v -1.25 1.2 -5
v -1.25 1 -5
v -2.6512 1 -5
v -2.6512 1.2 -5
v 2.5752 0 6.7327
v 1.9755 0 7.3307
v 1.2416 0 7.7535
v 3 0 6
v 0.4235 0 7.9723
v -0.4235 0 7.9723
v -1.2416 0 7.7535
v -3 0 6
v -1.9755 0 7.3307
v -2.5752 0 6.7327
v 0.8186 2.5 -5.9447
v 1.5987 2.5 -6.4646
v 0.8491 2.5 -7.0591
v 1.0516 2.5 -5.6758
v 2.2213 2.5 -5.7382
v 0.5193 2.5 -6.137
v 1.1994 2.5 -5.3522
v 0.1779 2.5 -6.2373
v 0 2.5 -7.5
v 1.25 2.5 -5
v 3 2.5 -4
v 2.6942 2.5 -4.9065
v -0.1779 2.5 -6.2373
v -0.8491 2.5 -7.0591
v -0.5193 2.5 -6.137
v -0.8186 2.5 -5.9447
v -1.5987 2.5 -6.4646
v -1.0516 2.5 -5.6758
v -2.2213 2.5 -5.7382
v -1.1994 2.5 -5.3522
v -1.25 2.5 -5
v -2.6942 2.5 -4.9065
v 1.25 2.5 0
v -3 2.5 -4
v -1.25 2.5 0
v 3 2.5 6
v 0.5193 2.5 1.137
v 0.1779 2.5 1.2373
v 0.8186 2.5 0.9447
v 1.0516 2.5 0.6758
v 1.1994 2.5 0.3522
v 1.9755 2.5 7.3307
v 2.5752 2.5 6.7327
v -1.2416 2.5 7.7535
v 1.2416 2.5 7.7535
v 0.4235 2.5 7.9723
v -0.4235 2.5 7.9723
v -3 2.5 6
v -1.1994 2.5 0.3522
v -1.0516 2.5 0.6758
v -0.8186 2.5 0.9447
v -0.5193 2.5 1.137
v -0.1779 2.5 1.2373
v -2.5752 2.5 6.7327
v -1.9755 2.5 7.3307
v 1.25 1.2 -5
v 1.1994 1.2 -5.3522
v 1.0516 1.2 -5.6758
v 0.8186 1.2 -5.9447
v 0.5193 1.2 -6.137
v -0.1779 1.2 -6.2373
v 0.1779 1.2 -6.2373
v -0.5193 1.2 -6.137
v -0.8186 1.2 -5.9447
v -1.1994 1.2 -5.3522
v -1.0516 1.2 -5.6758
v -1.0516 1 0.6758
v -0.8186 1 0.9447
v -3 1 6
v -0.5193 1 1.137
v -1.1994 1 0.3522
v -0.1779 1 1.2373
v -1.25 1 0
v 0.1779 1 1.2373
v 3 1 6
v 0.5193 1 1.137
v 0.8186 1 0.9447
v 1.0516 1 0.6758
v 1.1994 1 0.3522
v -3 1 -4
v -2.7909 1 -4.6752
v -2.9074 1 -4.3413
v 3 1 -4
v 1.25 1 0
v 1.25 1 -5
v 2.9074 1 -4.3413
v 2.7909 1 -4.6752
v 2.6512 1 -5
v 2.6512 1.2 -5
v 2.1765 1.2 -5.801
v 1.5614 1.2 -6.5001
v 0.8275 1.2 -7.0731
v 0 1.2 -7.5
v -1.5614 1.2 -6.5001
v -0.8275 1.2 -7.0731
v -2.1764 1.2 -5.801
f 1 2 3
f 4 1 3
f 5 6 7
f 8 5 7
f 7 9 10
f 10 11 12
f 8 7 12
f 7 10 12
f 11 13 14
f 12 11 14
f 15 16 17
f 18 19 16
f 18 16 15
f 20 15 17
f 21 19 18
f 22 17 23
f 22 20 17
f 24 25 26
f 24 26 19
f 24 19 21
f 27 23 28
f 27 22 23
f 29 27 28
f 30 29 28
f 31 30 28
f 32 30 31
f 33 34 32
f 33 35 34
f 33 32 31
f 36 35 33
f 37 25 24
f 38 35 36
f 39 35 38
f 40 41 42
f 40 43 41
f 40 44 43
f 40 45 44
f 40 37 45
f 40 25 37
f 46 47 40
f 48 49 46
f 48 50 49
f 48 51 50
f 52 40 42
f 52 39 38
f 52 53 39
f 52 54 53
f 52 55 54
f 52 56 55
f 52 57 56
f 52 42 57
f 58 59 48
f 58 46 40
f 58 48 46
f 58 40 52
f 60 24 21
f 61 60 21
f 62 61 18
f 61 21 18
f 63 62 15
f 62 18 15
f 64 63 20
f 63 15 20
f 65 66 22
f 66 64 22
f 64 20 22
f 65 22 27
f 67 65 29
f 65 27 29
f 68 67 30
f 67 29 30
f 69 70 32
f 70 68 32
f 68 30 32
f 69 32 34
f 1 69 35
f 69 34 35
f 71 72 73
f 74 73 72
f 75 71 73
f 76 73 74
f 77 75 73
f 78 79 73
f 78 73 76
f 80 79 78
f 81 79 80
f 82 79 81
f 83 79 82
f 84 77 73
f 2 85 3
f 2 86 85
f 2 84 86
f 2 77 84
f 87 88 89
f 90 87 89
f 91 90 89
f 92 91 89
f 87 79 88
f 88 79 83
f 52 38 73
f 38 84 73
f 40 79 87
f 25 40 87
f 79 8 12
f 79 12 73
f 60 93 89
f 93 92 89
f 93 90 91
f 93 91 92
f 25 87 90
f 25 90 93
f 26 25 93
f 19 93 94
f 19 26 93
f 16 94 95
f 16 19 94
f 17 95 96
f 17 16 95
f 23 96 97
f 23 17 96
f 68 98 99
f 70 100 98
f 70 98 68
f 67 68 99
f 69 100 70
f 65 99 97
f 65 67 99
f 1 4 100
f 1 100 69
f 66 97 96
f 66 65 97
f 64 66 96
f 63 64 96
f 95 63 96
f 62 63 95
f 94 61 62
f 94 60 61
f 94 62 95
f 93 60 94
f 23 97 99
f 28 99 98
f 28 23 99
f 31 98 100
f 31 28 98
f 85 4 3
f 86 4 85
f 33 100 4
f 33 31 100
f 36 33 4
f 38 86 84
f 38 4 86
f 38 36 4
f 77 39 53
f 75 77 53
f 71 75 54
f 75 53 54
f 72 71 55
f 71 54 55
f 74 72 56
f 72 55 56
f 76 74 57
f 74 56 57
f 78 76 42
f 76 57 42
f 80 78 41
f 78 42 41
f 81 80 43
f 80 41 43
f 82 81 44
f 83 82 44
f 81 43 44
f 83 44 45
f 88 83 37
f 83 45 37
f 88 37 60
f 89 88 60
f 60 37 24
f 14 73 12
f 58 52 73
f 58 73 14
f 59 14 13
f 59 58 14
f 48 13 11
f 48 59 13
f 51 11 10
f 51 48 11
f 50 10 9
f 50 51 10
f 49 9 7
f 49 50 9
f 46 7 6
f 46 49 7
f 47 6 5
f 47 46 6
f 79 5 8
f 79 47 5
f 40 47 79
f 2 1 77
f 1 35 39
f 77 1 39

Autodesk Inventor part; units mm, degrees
ref_plane "YZ Plane" through (0, 0, 0) normal (1, 0, 0) x (0, 1, 0)
ref_plane "XZ Plane" through (0, 0, 0) normal (0, 1, 0) x (-1, 0, 0)
ref_plane "XY Plane" through (0, 0, 0) normal (0, 0, 1) x (1, 0, 0)
sketch "Sketch1" plane through (0, 0, 0) normal (0, 1, 0) x (-1, 0, 0)
  line L0 (-3, -8) -> (3, -8)
  line L1 (3, -8) -> (3, 8)
  line L2 (3, 8) -> (-3, 8)
  line L3 (-3, 8) -> (-3, -8)
  line L4 (-3, -8) -> (3, 8) construction
  line L5 (3, -8) -> (-3, 8) construction
  point P0 (0, 0)
  dimension "d0" = 16
  dimension "d1" = 6
extrude "Extrusion1" add sketch "Sketch1" along normal blind 2.5
sketch "Sketch2" plane through (0, 2.5, 0) normal (0, 1, 0) x (1, 0, 0)
  line L0 (0, 5) -> (0, 0) construction
  line L1 (-1.25, 5) -> (-1.25, 0)
  line L2 (1.25, 0) -> (1.25, 5)
  arc A0 (1.25, 5) -> (-1.25, 5) centre (0, 5) ccw
  arc A1 (-1.25, 0) -> (1.25, 0) centre (0, 0) ccw
  line L3 (-3, -8) -> (3, -8) projected
  line L4 (-3, 8) -> (-3, -8) projected
  line L5 (-3, -8) -> (3, -8) projected
  line L6 (3, -8) -> (3, 8) projected
  line L7 (3, 8) -> (-3, 8) projected
  point P0 (0, 2.5)
  point P1 (0, 2.5)
  dimension "d4" = 2.5
  dimension "d6" = 8
  dimension "d7" = 6
  dimension "d8" = 3
  dimension "d9" = 5
extrude "Extrusion2" cut sketch "Sketch2" against normal through all contours A0 L2 A1 L1
sketch "Sketch3" plane through (3, 0, 8) normal (1, 0, 0) x (0, 0, -1)
  line L0 (16, 0) -> (0, 0) projected
  line L1 (16, 0) -> (2, 0)
  line L2 (2, 0) -> (2, 1)
  line L3 (2, 1) -> (16, 1)
  line L4 (16, 1) -> (16, 0)
  line L5 (0, 0) -> (0, 2.5) projected
  line L6 (0, 2.5) -> (16, 2.5) projected
  point P0 (8, 0)
  point P1 (2, 0)
  dimension "d12" = 2
  dimension "d13" = 1.5
extrude "Extrusion3" cut sketch "Sketch3" against normal through all
sketch "Sketch4" plane through (0, 2.5, 0) normal (0, 1, 0) x (1, 0, 0)
  line L0 (-3, 8) -> (-3, -8) projected
  line L1 (3, -8) -> (3, 8) projected
  arc A0 (-3, -6) -> (3, -6) centre (0, -4.75) ccw
  line L2 (-3, -8) -> (3, -8) projected
  point P0 (0, 0)
  point P1 (-2, 6)
  point P2 (2, 6)
  point P3 (3, 8)
  point P4 (0, -8)
  point P5 (-2.2361, -8)
  dimension "d17" = 2
extrude "Extrusion4" cut sketch "Sketch4" against normal through all
sketch "Sketch5" plane through (0, 2.5, 0) normal (0, 1, 0) x (1, 0, 0)
  line L0 (3, -6) -> (3, 8) projected
  line L1 (3, 8) -> (-3, 8) projected
  line L2 (-3, 8) -> (-3, -6) projected
  arc A0 (1.25, 5) -> (-1.25, 5) centre (0, 5) ccw projected
  arc A1 (3, 4) -> (0, 7.5) centre (-1.8689, 2.8624) ccw
  arc A2 (0, 7.5) -> (-3, 4) centre (1.8689, 2.8624) ccw
  point P0 (0, 0)
  point P1 (-3, 6.2041)
  point P2 (0, 6.25)
  point P3 (0, 6.25)
  dimension "d23" = 5
  dimension "d24" = 4
  dimension "d25" = 0.5
extrude "Extrusion5" cut sketch "Sketch5" against normal through all
sketch "Sketch6" plane through (-3, 1, 6) normal (0, -1, 0) x (1, 0, 0)
  line L0 (6.1469, -11) -> (-0.0299, -11)
  line L1 (-0.0299, -11) -> (-0.0299, -13.5)
  line L2 (-0.0299, -13.5) -> (6.1469, -13.5)
  line L3 (6.1469, -13.5) -> (6.1469, -11)
  arc A0 (1.75, -11) -> (4.25, -11) centre (3, -11) ccw projected
  point P0 (3, -6)
  point P1 (3, -13.5)
  point P2 (1.75, -11)
extrude "Extrusion6" cut sketch "Sketch6" against normal blind 0.2 contours L3 L2 L1 L0 A0
equation "\"d8\" = 0.5 * d7"
properties part number "Carrier Tab"
